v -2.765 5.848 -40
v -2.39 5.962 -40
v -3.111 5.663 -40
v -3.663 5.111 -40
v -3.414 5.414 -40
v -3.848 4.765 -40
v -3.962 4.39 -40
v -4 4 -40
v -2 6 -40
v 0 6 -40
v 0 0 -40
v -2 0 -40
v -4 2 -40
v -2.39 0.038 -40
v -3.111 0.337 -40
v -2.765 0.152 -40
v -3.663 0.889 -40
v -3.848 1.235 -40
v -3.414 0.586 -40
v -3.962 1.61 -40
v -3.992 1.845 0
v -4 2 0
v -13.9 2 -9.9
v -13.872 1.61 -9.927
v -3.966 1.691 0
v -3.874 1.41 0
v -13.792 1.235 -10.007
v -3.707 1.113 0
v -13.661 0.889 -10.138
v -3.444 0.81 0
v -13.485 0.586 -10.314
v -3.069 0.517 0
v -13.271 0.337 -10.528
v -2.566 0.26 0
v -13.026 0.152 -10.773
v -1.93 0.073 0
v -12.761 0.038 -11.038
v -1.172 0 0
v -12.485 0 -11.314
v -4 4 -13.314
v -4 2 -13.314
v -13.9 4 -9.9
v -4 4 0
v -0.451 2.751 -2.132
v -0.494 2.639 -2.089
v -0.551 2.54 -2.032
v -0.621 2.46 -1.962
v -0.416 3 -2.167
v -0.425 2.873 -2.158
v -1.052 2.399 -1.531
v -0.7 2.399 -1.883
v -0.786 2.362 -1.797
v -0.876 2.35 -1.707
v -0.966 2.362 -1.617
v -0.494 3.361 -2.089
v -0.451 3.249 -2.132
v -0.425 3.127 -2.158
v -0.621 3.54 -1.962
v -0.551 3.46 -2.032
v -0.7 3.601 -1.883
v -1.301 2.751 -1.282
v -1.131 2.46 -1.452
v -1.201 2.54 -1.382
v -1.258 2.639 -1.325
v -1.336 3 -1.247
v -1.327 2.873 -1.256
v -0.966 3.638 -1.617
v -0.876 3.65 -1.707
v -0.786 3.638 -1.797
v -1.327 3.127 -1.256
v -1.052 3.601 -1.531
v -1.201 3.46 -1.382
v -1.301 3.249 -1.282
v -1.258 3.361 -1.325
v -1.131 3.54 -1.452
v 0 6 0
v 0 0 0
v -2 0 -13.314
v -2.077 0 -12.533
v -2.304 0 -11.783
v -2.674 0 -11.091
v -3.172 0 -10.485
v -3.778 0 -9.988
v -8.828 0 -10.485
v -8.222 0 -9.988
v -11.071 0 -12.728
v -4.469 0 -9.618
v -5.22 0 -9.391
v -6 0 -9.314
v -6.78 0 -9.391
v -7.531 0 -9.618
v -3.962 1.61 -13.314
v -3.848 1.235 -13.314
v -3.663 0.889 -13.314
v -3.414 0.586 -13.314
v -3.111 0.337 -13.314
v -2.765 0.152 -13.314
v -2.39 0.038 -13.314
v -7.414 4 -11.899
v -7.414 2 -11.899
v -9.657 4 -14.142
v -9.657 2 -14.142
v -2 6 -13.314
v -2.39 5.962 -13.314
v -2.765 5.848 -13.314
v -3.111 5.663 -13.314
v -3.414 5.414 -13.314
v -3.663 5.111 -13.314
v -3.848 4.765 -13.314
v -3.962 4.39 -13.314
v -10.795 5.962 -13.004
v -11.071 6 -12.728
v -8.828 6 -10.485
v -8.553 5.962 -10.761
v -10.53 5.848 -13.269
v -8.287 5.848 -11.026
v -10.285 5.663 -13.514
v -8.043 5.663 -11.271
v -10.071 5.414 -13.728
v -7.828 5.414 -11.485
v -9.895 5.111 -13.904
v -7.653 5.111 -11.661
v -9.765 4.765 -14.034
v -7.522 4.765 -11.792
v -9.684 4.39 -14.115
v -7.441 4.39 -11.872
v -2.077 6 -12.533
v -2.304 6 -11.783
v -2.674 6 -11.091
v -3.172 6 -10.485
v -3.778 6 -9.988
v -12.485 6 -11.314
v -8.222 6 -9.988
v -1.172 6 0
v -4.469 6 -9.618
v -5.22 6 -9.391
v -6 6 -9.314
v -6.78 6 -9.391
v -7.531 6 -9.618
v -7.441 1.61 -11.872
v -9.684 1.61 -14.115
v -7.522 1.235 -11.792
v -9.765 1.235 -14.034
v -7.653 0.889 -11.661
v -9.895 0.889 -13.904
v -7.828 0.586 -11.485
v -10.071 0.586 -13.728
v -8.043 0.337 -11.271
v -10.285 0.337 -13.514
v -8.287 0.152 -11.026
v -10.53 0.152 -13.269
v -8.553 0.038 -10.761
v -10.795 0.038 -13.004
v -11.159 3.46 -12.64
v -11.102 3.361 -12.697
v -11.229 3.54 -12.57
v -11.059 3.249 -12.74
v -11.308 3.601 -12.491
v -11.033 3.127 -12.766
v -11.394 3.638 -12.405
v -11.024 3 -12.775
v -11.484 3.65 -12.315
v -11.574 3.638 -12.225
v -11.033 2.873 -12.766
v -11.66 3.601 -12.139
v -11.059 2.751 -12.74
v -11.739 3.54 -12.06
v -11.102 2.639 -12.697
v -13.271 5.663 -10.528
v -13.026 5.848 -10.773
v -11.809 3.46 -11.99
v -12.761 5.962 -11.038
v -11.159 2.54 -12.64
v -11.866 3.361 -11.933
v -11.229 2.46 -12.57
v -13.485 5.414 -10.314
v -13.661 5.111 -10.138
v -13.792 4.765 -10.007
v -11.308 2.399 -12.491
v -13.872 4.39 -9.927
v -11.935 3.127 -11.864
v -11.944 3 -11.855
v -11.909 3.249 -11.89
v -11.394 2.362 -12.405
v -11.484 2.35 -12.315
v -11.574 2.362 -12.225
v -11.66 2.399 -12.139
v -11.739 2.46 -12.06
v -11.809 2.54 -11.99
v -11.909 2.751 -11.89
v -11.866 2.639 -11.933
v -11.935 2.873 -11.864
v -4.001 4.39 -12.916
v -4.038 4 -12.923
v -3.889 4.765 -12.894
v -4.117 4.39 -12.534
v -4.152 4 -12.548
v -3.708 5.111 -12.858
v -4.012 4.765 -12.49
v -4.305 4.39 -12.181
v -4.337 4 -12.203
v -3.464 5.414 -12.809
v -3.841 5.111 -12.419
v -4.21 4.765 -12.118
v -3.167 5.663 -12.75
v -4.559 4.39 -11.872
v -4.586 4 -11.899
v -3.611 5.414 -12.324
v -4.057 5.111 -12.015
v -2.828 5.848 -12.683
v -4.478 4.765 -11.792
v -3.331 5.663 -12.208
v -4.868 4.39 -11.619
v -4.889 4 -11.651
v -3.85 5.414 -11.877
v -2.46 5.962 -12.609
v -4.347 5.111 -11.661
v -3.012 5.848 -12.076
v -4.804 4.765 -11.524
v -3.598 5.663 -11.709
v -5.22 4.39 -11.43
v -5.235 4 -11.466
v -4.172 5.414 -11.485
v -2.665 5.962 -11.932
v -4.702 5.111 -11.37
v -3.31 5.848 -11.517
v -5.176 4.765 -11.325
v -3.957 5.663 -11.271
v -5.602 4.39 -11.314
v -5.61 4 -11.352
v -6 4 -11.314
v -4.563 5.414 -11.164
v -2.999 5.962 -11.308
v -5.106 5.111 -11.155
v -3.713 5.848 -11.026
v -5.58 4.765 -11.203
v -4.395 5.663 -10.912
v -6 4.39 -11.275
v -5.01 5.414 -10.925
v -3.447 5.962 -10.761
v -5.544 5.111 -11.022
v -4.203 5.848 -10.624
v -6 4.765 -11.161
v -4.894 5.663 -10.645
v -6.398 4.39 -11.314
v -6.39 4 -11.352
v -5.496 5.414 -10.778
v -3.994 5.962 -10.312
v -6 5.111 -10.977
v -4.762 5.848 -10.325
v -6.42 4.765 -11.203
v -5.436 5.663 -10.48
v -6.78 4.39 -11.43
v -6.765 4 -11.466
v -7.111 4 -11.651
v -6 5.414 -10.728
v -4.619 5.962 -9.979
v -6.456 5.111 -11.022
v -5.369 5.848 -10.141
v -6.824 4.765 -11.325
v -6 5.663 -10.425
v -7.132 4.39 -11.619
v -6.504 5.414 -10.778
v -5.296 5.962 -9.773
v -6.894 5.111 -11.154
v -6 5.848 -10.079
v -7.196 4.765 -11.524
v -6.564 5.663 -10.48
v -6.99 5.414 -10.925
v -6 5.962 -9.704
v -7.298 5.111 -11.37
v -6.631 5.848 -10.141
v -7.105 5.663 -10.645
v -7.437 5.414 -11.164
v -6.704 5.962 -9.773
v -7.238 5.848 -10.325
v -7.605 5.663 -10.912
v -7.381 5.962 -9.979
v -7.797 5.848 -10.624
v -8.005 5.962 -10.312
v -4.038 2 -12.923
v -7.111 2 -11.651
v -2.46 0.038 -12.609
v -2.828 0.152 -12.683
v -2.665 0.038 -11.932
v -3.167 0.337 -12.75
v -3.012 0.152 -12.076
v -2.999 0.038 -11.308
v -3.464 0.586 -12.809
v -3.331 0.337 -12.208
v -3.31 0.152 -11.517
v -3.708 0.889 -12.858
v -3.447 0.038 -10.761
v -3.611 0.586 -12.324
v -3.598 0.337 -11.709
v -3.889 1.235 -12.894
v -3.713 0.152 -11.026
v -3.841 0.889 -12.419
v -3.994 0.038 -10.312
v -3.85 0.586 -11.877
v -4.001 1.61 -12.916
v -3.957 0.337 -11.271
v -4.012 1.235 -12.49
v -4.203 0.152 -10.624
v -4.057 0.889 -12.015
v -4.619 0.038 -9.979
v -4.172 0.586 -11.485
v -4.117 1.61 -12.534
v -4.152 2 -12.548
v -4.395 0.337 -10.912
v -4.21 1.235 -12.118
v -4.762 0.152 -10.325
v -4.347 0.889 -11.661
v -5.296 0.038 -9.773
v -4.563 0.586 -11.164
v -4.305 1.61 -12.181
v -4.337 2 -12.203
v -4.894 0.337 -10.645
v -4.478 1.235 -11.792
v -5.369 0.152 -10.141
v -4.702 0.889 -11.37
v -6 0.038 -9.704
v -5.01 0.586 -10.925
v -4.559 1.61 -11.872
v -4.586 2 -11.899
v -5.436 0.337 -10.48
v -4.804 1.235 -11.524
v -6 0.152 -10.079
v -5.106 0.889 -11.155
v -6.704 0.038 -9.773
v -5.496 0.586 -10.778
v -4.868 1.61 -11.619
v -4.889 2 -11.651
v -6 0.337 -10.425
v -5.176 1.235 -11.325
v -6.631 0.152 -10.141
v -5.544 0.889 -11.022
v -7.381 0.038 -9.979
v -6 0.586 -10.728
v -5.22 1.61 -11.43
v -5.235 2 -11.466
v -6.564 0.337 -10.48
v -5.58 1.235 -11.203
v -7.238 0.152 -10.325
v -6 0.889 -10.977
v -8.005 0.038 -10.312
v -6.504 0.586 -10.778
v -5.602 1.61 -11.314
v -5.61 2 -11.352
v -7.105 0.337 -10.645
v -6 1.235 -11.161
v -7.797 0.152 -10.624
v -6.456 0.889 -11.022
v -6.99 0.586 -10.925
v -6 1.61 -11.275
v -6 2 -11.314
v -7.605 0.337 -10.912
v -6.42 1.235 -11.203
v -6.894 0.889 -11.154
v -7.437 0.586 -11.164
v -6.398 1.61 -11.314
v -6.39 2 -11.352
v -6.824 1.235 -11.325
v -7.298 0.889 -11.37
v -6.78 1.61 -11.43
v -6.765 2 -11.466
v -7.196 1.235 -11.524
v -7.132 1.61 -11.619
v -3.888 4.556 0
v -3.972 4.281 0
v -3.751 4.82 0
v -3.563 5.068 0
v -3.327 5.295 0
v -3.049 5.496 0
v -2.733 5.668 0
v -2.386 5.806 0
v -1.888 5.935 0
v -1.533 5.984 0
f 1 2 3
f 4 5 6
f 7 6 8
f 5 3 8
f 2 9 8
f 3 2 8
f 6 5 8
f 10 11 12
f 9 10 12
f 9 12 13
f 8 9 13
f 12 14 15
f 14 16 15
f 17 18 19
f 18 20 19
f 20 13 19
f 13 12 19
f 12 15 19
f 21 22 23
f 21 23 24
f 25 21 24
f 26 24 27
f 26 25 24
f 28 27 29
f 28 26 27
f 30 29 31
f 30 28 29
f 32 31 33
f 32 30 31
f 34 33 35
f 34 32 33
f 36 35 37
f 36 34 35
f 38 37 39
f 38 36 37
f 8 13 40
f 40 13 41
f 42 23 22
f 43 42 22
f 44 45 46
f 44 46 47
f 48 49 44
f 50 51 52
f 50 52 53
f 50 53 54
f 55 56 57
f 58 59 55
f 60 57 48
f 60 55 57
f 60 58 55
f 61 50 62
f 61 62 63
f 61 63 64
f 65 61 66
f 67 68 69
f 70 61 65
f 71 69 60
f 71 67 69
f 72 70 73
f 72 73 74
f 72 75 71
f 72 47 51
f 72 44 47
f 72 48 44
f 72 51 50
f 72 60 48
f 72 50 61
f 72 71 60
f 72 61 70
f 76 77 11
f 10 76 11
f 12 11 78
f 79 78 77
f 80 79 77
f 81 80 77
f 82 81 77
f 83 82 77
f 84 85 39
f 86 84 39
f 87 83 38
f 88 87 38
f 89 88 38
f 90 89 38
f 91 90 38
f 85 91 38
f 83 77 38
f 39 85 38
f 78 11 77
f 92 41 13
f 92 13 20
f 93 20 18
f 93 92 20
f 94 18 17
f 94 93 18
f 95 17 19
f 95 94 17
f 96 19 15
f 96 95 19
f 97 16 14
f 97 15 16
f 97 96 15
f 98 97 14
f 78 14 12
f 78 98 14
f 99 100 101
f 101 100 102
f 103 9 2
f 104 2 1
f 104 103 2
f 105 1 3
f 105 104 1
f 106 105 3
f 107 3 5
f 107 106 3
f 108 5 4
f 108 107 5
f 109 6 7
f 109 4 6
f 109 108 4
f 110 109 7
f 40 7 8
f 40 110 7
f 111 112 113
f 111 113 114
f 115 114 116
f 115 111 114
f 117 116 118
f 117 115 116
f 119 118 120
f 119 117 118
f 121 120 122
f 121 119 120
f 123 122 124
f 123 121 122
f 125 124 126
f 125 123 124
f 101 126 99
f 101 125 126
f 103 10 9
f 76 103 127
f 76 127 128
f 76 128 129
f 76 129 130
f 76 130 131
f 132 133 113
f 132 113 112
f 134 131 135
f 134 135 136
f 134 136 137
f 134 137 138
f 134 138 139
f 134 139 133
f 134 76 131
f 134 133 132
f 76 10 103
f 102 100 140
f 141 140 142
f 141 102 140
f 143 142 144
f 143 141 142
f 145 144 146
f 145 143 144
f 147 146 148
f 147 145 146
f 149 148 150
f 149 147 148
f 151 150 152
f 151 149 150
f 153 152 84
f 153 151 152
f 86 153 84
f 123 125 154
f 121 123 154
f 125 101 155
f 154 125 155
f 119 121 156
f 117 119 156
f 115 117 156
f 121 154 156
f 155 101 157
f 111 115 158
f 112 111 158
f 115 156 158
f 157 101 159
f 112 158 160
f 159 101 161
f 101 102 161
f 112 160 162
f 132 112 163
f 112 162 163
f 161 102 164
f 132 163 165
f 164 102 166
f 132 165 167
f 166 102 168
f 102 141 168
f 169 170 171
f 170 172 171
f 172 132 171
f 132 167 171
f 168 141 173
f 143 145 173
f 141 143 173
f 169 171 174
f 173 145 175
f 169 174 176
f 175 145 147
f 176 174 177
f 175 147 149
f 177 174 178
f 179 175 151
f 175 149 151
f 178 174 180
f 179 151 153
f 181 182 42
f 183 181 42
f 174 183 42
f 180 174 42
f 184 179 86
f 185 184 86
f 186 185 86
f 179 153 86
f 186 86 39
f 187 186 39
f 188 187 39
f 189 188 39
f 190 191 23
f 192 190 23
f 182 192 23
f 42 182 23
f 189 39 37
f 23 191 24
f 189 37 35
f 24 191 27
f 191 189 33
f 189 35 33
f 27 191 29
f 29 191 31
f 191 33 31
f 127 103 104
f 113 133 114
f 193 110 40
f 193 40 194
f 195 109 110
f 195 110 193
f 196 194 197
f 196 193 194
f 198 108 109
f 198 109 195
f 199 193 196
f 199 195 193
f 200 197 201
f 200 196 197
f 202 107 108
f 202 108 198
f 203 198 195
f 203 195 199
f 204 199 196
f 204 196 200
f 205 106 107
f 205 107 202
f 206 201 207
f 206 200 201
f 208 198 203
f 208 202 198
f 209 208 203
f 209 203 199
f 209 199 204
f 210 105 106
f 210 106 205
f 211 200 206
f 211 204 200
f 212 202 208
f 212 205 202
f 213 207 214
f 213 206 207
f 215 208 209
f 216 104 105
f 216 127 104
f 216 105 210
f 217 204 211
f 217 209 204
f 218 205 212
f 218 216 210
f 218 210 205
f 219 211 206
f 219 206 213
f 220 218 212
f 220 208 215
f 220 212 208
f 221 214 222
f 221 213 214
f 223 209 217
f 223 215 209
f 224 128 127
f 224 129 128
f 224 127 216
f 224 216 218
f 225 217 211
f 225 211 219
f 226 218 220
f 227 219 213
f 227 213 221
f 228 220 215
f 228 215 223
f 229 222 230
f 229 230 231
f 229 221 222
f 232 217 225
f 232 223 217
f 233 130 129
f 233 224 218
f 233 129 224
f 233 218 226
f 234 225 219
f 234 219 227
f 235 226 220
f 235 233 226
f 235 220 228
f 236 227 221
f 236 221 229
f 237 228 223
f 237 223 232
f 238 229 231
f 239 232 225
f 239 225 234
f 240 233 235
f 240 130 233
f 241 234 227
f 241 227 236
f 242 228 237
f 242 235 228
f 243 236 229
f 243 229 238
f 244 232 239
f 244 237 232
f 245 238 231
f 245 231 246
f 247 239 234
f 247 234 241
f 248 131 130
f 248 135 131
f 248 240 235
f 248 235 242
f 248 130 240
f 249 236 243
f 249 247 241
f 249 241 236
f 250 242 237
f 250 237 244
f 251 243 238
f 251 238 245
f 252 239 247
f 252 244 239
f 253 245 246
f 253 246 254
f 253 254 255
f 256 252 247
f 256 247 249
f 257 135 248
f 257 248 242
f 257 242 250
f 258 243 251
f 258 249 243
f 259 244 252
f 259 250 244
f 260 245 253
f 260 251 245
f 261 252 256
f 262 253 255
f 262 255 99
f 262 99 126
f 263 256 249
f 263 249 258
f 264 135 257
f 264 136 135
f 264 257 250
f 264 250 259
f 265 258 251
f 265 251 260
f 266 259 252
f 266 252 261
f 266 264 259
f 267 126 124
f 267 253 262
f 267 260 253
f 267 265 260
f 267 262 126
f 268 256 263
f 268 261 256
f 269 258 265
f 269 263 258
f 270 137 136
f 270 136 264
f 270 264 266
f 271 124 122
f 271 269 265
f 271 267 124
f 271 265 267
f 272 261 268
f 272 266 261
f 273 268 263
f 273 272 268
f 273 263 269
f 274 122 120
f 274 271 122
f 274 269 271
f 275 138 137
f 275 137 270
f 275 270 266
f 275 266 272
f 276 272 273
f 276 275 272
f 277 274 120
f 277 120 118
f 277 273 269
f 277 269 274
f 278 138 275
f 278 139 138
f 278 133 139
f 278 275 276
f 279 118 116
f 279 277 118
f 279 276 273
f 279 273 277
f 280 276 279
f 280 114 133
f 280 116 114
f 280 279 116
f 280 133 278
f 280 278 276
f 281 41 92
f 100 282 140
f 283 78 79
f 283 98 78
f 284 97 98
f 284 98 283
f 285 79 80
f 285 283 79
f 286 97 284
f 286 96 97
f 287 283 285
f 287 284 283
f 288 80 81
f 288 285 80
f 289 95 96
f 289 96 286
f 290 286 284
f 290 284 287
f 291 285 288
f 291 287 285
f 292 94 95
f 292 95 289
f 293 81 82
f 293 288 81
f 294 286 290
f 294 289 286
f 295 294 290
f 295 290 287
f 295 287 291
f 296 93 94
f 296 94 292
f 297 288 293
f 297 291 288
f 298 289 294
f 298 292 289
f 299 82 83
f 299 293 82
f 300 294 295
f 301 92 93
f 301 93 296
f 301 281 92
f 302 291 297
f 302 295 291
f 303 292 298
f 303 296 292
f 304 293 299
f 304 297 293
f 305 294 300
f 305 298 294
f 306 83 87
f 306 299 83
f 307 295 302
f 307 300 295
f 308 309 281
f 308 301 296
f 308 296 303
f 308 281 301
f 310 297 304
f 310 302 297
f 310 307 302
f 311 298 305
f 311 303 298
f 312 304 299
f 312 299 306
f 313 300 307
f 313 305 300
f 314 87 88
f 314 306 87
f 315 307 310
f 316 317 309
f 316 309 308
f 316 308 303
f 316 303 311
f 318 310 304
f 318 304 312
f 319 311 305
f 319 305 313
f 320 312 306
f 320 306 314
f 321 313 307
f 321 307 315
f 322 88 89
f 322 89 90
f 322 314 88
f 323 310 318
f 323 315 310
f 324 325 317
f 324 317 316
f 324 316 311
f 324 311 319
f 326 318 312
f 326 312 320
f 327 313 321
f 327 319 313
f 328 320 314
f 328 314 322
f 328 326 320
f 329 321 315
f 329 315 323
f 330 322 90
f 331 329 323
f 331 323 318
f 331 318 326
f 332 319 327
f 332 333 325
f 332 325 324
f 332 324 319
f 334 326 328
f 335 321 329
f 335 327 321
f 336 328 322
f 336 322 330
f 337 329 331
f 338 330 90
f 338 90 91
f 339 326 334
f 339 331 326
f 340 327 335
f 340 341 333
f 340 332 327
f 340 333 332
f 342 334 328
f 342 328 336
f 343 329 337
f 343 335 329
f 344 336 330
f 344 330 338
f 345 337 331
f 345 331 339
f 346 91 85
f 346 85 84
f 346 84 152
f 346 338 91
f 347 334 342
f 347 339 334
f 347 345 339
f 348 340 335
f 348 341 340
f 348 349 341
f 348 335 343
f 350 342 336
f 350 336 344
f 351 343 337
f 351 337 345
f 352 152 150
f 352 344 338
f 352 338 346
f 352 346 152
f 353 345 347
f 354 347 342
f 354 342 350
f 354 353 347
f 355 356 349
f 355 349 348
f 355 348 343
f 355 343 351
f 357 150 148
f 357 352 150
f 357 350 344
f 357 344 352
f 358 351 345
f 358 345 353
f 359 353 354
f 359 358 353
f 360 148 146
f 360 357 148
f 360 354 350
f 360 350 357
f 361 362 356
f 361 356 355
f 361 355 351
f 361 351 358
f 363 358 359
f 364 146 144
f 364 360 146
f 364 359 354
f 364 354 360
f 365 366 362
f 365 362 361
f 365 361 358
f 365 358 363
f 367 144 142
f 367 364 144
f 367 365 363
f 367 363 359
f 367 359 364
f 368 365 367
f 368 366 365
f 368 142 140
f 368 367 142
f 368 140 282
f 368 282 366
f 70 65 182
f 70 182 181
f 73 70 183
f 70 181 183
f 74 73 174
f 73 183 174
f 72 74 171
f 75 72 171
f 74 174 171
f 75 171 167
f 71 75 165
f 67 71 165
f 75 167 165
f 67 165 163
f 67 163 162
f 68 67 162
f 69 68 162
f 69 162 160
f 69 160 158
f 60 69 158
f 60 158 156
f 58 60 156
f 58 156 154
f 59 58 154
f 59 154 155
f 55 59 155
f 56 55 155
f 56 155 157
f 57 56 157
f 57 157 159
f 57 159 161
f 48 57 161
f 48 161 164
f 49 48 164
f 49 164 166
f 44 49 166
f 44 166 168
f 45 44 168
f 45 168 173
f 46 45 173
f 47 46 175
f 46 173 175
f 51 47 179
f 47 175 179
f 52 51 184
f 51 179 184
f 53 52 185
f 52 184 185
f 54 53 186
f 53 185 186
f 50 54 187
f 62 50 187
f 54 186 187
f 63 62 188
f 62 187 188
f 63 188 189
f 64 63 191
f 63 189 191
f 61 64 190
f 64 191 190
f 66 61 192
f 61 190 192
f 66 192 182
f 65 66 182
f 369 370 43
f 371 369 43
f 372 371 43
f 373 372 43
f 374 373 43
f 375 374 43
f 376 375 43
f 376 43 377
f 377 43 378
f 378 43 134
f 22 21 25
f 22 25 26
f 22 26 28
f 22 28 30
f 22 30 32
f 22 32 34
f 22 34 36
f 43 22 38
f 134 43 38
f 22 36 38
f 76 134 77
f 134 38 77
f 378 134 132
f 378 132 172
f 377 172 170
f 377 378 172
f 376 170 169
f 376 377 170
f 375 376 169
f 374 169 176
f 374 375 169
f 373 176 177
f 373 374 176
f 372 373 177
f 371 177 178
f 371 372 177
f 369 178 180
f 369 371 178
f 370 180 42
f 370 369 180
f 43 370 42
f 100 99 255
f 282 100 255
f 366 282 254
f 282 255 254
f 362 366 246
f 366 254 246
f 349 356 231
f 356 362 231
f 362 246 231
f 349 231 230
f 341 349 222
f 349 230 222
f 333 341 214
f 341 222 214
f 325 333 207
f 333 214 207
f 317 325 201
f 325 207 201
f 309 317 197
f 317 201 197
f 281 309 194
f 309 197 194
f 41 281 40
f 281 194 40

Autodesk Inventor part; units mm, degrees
ref_plane "YZ Plane" through (0, 0, 0) normal (1, 0, 0) x (0, 1, 0)
ref_plane "XZ Plane" through (0, 0, 0) normal (0, 1, 0) x (-1, 0, 0)
ref_plane "XY Plane" through (0, 0, 0) normal (0, 0, 1) x (1, 0, 0)
sketch "Sketch1" plane through (0, 0, 0) normal (0, 1, 0) x (-1, 0, 0)
  line L0 (0, 0) -> (0, -40)
  line L1 (0, -40) -> (4, -40)
  line L2 (4, -40) -> (4, -8.4853)
  line L3 (4, -8.4853) -> (9.6569, -14.1421)
  line L4 (9.6569, -14.1421) -> (13.8995, -9.8995)
  line L5 (13.8995, -9.8995) -> (4, 0)
  line L6 (4, 0) -> (0, 0)
  dimension "d0" = 45
  dimension "d1" = 4
  dimension "d2" = 40
  dimension "d12" = 6
  dimension "d13" = 8
  dimension "d14" = 4
extrude "Extrusion1" add sketch "Sketch1" along normal blind 6
sketch "Sketch2" plane through (-13.8995, 0, -9.8995) normal (-0.7071, 0, -0.7071) x (-0.7071, 0, 0.7071)
  line L0 (-2.8284, 0) -> (-2.8284, 6) projected
  line L1 (-6, 0) -> (0, 0) projected
  line L2 (0, 0) -> (0, 6) projected
  line L3 (-6, 6) -> (0, 6) projected
  line L4 (-6, 0) -> (-6, 6) projected
  circle A0 centre (-3.416, 3) radius 0.65
  dimension "d5" = 1.3
  dimension "d6" = 3
extrude "Extrusion2" cut sketch "Sketch2" against normal blind 15 contours A0 L0 | L0 A0
fillet "Fillet1" radius 2 1 edges at (-4, 3, -8.4853)
fillet "Fillet2" radius 2 6 edges at (-8.5355, 6, -13.0208) (-4, 6, -26.6569) (-8.5355, 0, -13.0208) (-4, 0, -26.6569) (-8.9497, 6, -4.9497) (-8.9497, 0, -4.9497)
properties part number "AntennaAdapter" material "ABS Plastic"
